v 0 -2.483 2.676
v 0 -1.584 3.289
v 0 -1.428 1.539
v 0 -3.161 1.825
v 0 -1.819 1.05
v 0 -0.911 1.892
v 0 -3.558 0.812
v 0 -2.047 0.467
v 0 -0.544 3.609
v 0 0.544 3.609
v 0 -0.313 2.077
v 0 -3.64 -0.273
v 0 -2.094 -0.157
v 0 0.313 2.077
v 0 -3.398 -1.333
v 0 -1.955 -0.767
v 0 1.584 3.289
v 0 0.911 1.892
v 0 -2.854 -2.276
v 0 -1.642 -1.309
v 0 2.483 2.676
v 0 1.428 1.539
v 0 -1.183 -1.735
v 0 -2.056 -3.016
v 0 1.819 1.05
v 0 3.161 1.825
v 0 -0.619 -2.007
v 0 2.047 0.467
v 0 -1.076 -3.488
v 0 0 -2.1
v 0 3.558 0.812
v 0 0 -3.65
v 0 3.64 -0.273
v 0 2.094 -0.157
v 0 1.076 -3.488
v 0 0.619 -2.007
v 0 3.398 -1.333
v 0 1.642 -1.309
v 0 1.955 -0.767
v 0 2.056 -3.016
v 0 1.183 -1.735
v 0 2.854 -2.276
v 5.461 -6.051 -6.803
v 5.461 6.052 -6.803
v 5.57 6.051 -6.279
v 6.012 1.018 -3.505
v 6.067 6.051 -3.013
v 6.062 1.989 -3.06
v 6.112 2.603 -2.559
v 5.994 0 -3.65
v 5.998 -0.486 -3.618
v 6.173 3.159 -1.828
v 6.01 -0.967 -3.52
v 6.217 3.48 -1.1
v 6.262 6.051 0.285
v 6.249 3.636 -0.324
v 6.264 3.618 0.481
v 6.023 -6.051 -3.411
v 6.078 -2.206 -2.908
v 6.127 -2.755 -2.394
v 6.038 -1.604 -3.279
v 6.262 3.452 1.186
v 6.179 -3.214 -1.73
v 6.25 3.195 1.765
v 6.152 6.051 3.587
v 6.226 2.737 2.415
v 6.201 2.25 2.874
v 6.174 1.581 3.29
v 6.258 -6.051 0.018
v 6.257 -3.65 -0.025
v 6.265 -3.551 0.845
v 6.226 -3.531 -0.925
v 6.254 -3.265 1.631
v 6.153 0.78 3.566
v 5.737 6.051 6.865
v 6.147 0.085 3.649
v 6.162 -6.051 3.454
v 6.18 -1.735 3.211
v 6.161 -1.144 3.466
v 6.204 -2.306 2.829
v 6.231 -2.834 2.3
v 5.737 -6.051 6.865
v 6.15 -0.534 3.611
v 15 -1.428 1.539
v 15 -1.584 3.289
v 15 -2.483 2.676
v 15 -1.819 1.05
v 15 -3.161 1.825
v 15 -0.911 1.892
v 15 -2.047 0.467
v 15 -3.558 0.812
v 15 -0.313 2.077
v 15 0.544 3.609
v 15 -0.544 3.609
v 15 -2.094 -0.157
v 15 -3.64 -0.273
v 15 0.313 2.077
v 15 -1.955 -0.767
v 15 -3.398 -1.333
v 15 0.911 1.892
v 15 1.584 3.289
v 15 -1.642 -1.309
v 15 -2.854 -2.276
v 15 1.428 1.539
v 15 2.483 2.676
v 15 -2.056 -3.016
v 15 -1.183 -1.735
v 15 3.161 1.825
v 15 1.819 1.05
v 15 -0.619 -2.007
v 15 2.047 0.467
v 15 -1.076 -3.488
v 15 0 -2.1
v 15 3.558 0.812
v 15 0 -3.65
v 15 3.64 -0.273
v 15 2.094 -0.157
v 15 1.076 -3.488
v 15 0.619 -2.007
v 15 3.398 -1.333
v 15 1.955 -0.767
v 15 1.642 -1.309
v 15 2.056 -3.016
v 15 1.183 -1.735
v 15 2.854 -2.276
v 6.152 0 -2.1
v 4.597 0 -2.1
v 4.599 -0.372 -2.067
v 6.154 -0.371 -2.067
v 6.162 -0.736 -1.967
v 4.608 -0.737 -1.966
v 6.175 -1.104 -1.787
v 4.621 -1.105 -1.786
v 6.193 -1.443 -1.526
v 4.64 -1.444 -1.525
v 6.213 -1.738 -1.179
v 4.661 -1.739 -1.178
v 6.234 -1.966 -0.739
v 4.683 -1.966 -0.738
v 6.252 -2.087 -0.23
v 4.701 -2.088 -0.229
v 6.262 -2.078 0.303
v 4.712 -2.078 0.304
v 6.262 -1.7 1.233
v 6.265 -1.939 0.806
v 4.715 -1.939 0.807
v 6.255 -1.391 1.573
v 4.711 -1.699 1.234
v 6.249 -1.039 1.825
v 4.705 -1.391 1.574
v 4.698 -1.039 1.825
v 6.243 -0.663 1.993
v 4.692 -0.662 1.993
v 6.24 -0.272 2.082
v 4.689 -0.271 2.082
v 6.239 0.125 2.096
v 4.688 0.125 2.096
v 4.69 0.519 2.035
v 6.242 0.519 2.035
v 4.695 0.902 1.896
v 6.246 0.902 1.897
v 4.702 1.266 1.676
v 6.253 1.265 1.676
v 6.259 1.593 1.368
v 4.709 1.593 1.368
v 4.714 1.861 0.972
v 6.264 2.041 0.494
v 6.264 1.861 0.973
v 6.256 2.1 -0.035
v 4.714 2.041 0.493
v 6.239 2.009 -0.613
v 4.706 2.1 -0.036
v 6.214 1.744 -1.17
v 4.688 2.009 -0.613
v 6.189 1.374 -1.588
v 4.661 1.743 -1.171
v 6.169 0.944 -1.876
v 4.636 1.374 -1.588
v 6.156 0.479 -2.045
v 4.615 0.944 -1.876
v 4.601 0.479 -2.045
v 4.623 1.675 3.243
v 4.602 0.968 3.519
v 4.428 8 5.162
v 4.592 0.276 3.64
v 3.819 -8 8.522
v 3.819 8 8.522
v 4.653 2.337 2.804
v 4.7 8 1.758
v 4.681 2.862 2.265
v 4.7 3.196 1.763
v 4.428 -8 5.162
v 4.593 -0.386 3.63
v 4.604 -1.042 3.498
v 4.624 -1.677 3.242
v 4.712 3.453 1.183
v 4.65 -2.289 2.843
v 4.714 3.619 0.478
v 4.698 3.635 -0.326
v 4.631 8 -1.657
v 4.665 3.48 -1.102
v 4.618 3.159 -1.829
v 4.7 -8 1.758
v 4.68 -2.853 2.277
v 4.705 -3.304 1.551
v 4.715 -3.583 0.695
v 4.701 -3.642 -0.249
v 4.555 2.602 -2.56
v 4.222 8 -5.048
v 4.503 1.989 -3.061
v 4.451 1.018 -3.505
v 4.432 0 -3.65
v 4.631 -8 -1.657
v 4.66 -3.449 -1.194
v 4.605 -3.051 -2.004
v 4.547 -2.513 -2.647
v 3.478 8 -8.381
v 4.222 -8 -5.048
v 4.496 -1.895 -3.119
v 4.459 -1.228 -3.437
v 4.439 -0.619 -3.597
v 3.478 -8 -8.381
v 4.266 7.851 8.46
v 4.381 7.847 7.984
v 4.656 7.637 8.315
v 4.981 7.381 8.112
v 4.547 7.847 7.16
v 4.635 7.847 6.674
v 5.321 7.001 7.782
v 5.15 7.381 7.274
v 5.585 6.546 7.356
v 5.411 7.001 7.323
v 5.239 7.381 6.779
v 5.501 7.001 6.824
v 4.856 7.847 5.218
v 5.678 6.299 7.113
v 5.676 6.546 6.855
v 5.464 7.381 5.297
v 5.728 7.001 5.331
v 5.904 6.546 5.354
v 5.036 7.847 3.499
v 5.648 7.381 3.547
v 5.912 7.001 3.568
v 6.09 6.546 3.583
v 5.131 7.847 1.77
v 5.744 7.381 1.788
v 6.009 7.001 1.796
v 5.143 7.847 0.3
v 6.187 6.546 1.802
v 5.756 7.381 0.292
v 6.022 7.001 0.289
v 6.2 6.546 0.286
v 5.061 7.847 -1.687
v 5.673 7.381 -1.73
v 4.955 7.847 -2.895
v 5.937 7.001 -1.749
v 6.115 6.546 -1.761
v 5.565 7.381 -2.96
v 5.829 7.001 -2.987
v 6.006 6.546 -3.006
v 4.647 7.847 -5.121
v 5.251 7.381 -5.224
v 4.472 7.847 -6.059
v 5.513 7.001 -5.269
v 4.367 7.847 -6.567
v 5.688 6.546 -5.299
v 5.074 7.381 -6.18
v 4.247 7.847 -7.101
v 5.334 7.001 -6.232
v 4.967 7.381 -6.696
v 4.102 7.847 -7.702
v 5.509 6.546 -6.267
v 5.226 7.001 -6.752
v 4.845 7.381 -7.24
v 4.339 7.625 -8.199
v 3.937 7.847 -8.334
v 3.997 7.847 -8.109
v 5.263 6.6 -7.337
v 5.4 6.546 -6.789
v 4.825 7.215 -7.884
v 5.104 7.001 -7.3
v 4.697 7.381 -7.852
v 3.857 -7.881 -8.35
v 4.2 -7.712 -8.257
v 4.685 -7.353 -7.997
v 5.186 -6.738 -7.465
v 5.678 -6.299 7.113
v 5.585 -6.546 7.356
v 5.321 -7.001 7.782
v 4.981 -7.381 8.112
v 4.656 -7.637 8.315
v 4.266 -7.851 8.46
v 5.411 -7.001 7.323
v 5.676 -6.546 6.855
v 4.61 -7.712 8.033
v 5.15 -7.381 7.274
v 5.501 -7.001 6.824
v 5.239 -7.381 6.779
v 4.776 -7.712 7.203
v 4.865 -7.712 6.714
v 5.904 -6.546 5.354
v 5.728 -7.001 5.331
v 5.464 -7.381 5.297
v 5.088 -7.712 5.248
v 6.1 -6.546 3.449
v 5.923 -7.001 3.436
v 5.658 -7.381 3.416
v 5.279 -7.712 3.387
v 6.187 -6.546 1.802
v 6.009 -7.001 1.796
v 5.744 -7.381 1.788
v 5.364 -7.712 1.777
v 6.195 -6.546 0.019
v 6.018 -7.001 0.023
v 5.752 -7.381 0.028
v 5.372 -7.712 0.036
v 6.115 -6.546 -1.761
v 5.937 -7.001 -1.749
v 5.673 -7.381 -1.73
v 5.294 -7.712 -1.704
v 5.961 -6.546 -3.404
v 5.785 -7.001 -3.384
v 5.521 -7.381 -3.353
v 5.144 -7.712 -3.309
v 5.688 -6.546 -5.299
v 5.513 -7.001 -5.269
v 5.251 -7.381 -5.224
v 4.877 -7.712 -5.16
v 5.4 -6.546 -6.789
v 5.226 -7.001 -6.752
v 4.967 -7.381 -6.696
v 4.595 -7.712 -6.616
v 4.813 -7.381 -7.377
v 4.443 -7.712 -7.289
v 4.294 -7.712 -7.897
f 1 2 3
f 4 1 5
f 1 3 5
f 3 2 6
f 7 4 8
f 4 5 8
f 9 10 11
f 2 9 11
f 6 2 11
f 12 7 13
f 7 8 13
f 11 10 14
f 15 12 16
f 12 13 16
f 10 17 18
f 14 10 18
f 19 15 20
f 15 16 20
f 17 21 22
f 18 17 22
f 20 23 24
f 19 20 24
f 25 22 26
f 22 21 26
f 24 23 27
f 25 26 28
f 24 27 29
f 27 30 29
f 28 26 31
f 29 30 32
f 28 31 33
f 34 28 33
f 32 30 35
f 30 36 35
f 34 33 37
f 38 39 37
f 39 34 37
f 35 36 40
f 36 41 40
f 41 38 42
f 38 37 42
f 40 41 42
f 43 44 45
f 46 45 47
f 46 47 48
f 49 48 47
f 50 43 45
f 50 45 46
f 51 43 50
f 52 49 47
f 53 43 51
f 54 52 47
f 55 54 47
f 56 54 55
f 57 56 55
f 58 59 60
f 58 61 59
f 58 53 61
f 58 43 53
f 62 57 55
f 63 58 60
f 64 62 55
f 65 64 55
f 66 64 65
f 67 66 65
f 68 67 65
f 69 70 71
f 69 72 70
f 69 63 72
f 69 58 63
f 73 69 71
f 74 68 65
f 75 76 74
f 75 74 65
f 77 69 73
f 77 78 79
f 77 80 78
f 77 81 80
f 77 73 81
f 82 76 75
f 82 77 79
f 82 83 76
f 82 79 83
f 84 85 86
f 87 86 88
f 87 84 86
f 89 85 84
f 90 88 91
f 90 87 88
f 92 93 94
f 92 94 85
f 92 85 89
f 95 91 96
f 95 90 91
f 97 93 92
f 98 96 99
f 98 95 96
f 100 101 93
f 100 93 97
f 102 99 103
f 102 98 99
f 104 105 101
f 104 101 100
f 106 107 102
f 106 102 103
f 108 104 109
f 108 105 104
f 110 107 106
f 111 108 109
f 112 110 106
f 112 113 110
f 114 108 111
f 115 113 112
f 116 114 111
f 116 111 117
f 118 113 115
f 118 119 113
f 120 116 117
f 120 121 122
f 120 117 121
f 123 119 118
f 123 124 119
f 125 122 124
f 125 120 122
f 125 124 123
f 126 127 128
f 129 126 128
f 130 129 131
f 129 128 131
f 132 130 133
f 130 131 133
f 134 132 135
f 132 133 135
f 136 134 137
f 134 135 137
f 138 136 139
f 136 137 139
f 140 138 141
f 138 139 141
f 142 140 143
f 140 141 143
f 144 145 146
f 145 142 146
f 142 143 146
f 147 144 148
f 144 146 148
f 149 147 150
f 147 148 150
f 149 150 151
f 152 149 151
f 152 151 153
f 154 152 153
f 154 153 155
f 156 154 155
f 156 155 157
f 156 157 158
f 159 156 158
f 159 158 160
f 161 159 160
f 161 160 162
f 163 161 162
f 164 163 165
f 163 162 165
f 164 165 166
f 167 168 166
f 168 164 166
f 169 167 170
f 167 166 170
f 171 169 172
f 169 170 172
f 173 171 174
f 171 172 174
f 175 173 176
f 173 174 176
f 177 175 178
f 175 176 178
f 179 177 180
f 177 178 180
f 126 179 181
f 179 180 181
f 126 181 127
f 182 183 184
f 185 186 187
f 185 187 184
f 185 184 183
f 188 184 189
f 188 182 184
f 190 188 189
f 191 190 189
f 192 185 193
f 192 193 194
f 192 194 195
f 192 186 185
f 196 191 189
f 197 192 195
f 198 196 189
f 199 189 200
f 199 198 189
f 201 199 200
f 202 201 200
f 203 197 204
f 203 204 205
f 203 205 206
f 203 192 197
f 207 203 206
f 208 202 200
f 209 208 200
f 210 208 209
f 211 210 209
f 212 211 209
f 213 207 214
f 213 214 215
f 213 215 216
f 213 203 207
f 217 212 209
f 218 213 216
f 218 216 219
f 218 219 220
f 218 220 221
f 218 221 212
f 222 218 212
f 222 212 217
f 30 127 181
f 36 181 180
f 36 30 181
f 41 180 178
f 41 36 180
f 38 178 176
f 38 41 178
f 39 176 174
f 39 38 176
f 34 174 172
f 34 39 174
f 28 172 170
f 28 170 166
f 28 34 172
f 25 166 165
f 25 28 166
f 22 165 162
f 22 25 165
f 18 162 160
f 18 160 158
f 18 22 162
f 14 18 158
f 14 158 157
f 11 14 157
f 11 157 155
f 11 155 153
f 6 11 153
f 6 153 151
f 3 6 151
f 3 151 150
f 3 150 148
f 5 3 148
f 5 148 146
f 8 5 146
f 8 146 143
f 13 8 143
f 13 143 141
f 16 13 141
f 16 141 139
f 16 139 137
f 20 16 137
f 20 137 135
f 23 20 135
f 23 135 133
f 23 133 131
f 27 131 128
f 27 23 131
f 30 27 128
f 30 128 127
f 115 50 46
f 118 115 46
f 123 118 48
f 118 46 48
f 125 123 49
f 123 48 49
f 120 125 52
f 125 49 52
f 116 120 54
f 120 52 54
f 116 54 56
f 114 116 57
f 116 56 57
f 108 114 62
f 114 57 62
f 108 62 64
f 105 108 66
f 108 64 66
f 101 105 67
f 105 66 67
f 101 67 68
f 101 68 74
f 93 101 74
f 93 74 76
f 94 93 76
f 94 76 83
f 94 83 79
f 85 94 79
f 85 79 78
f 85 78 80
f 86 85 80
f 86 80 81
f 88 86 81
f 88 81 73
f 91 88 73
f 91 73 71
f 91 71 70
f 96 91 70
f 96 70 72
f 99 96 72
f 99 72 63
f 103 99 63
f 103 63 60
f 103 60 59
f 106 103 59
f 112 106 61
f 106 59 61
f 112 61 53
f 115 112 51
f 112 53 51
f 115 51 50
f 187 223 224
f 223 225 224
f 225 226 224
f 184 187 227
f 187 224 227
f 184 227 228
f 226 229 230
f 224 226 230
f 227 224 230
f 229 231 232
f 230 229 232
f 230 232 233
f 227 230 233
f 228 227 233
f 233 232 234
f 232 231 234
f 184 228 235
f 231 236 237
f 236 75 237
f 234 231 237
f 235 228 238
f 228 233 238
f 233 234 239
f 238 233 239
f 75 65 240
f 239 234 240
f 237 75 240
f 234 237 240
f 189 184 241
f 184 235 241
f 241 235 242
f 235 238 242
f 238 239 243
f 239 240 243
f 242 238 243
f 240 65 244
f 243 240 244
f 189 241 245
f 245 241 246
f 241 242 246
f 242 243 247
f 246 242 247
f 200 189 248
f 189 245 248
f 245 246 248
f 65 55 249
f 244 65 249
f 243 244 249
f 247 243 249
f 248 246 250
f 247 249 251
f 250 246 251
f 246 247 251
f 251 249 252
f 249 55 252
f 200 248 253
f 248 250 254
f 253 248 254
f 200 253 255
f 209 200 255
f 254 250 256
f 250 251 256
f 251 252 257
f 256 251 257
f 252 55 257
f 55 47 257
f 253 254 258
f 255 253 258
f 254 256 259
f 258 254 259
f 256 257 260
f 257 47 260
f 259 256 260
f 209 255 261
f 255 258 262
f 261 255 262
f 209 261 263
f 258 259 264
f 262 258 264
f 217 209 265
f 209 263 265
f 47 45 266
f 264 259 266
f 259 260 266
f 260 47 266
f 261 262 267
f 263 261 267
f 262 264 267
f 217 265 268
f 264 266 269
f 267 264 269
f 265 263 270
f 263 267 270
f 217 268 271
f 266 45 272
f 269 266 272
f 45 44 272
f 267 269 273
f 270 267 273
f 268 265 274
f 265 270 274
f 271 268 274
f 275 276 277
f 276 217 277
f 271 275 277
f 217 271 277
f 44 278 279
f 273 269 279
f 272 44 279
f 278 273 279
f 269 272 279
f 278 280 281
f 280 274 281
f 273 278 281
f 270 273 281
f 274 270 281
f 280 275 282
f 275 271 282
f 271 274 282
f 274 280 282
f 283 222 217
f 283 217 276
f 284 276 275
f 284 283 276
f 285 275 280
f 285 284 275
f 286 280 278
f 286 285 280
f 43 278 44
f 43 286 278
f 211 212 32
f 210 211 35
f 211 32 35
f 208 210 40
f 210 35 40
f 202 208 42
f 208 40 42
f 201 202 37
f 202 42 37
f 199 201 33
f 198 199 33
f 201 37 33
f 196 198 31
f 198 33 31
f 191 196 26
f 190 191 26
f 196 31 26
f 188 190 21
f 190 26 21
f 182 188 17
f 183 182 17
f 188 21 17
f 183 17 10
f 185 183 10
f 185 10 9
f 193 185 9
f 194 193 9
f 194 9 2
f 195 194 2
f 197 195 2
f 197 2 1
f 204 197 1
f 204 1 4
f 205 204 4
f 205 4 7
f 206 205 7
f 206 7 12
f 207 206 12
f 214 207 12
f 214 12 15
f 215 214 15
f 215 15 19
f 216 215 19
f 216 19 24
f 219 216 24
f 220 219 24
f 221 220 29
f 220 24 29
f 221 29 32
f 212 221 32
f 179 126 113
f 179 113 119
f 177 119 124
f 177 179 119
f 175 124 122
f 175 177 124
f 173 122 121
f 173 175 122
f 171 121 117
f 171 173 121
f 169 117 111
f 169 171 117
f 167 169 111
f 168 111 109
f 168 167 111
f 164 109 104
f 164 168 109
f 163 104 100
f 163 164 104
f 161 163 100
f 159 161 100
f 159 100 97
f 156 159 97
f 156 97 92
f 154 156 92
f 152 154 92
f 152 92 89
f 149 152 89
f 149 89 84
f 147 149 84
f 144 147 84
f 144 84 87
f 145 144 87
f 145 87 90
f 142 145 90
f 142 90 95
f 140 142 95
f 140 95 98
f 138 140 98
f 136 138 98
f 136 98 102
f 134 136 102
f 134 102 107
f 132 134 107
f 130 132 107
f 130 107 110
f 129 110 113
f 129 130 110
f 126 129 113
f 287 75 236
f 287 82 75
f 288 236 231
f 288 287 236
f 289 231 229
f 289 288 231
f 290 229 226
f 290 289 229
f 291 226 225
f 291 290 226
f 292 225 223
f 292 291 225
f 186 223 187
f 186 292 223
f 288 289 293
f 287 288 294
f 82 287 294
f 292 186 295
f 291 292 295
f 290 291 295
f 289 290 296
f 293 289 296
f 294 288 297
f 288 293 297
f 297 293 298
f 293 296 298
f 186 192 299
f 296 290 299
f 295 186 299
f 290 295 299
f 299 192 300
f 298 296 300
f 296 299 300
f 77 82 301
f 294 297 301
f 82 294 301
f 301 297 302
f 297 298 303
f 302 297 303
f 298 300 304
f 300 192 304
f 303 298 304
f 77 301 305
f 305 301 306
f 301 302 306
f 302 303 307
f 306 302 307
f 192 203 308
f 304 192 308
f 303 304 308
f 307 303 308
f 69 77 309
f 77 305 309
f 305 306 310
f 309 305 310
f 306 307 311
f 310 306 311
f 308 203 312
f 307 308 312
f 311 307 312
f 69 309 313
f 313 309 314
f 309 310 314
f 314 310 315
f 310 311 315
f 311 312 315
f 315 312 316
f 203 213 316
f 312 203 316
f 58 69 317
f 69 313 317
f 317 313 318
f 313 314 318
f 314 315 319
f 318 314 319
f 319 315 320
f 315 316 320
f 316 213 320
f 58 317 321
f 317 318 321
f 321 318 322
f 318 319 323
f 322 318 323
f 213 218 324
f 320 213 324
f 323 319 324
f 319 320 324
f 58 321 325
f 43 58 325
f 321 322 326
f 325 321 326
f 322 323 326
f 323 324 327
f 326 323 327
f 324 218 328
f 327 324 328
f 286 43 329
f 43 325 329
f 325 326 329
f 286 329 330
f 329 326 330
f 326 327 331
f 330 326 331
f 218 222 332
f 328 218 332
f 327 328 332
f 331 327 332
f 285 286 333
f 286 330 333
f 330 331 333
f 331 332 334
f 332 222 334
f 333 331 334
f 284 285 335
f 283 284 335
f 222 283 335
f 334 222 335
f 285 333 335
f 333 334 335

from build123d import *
from OCP.BRepAlgoAPI import BRepAlgoAPI_Cut
from OCP.TopTools import TopTools_ListOfShape

# Parameters (mm, degrees)
SKETCH3_R                = 3.65
SKETCH3_R_2              = 2.1
BOSS_EXTRUDE3_DEPTH      = 15
BOSS_EXTRUDE4_DEPTH      = 8
BOSS_EXTRUDE4_DEPTH_BACK = 8
SKETCH7_R                = 2.1
CUT_EXTRUDE1_DEPTH       = 18
FILLET2_START            = -8
FILLET2_DEPTH            = 16
FILLET2_2_ANGLE          = 28.578113
FILLET2_3_ANGLE          = 28.578113


with BuildPart() as part:
    # Sketch3 → Boss-Extrude3 (new body)
    with BuildSketch(Plane(origin=(0, 0, 0), x_dir=(0, 0, -1), z_dir=(1, 0, 0))):
        Circle(SKETCH3_R)
        Circle(SKETCH3_R_2, mode=Mode.SUBTRACT)
    extrude(amount=BOSS_EXTRUDE3_DEPTH)

    # Sketch6 → Boss-Extrude4 (add, two sides: drawn at the far end of the back side and taken through both)
    with BuildSketch(Plane(origin=(0, 0, 0), x_dir=(1, 0, 0), z_dir=(0, 1, 0)).offset(-BOSS_EXTRUDE4_DEPTH_BACK)):
        with BuildLine():
            Line((3.477507, 8.380826), (4.919958, 8.978308))
            ThreePointArc((4.919958, 8.978308), (6.258182, -0.050001), (5.26999, -9.123296))
            Line((5.26999, -9.123296), (3.819467, -8.52247))
            ThreePointArc((3.819467, -8.52247), (4.707866, -0.049391), (3.477507, 8.380826))
        make_face()
    extrude(amount=BOSS_EXTRUDE4_DEPTH + BOSS_EXTRUDE4_DEPTH_BACK)

    # Sketch7 → Cut-Extrude1 (cut)
    with BuildSketch(Plane.ZY):
        with Locations(Location((0, 0, 0), (0, 0, 180))):
            Circle(SKETCH7_R)
    extrude(amount=-CUT_EXTRUDE1_DEPTH, mode=Mode.SUBTRACT)


with BuildPart() as fillet2_tool:
    # Fillet2: read off the stored shape, not the designer's step
    # Fillet2 outline → Fillet2 (new body)
    with BuildSketch(Plane(origin=(0, 0, 0), x_dir=(1, 0, 0), z_dir=(0, 1, 0)).offset(FILLET2_START)):
        with BuildLine():
            ThreePointArc((5.26999, -9.123296), (5.521856, -7.99803), (5.737351, -6.865235))
            ThreePointArc((5.737351, -6.865235), (5.074459, -8.036465), (3.819467, -8.52247))
            Line((3.819467, -8.52247), (5.26999, -9.123296))
        make_face()
        with BuildLine():
            ThreePointArc((3.477507, 8.380826), (4.751128, 7.945976), (5.460847, 6.802514))
            ThreePointArc((5.460847, 6.802514), (5.20744, 7.894646), (4.919958, 8.978308))
            Line((4.919958, 8.978308), (3.477507, 8.380826))
        make_face()
    extrude(amount=FILLET2_DEPTH)


with BuildPart() as part_1:
    add(part.part)

    # Fillet2: cut by fillet2_tool, with a tolerance
    fillet2_stock = TopTools_ListOfShape()
    fillet2_stock.Append(part_1.part.wrapped)
    fillet2_tools = TopTools_ListOfShape()
    fillet2_tools.Append(fillet2_tool.part.wrapped)
    fillet2_cut = BRepAlgoAPI_Cut()
    fillet2_cut.SetArguments(fillet2_stock)
    fillet2_cut.SetTools(fillet2_tools)
    fillet2_cut.SetFuzzyValue(0.00001)
    fillet2_cut.Build()
    add(Compound.cast(fillet2_cut.Shape()).solids(), mode=Mode.REPLACE)


with BuildPart() as fillet2_2_tool:
    # Fillet2 2 outline → Fillet2 2 (revolve)
    with BuildSketch(Plane(origin=(-29.535127, 0, 0.742139), x_dir=(0.9738567621765157, 0, 0.22716295200378364), z_dir=(-0.22716295200378364, 0, 0.9738567621765157))):
        with BuildLine():
            Line((35.8, -8), (35.8, -6.051282))
            ThreePointArc((35.8, -6.051282), (35.365248, -7.296272), (34.25, -8))
            Line((34.25, -8), (35.8, -8))
        make_face()
    revolve(axis=Axis((-29.535127, 0, 0.742139), (0, 1, 0)), revolution_arc=FILLET2_2_ANGLE)


with BuildPart() as part_2:
    add(part_1.part)

    # Fillet2 2: cut by fillet2_2_tool, with a tolerance
    fillet2_2_stock = TopTools_ListOfShape()
    fillet2_2_stock.Append(part_2.part.wrapped)
    fillet2_2_tools = TopTools_ListOfShape()
    fillet2_2_tools.Append(fillet2_2_tool.part.wrapped)
    fillet2_2_cut = BRepAlgoAPI_Cut()
    fillet2_2_cut.SetArguments(fillet2_2_stock)
    fillet2_2_cut.SetTools(fillet2_2_tools)
    fillet2_2_cut.SetFuzzyValue(0.00001)
    fillet2_2_cut.Build()
    add(Compound.cast(fillet2_2_cut.Shape()).solids(), mode=Mode.REPLACE)


with BuildPart() as fillet2_3_tool:
    # Fillet2 3 outline → Fillet2 3 (revolve)
    with BuildSketch(Plane(origin=(-29.535127, 0, 0.742139), x_dir=(0.9738567621765157, 0, 0.22716295200378342), z_dir=(-0.22716295200378342, 0, 0.9738567621765157))):
        with BuildLine():
            ThreePointArc((34.25, 8), (35.365248, 7.296272), (35.8, 6.051282))
            Line((35.8, 6.051282), (35.8, 8))
            Line((35.8, 8), (34.25, 8))
        make_face()
    revolve(axis=Axis((-29.535127, 0, 0.742139), (0, 1, 0)), revolution_arc=FILLET2_3_ANGLE)


with BuildPart() as part_3:
    add(part_2.part)

    # Fillet2 3: cut by fillet2_3_tool, with a tolerance
    fillet2_3_stock = TopTools_ListOfShape()
    fillet2_3_stock.Append(part_3.part.wrapped)
    fillet2_3_tools = TopTools_ListOfShape()
    fillet2_3_tools.Append(fillet2_3_tool.part.wrapped)
    fillet2_3_cut = BRepAlgoAPI_Cut()
    fillet2_3_cut.SetArguments(fillet2_3_stock)
    fillet2_3_cut.SetTools(fillet2_3_tools)
    fillet2_3_cut.SetFuzzyValue(0.00001)
    fillet2_3_cut.Build()
    add(Compound.cast(fillet2_3_cut.Shape()).solids(), mode=Mode.REPLACE)


solid = part_3.part
